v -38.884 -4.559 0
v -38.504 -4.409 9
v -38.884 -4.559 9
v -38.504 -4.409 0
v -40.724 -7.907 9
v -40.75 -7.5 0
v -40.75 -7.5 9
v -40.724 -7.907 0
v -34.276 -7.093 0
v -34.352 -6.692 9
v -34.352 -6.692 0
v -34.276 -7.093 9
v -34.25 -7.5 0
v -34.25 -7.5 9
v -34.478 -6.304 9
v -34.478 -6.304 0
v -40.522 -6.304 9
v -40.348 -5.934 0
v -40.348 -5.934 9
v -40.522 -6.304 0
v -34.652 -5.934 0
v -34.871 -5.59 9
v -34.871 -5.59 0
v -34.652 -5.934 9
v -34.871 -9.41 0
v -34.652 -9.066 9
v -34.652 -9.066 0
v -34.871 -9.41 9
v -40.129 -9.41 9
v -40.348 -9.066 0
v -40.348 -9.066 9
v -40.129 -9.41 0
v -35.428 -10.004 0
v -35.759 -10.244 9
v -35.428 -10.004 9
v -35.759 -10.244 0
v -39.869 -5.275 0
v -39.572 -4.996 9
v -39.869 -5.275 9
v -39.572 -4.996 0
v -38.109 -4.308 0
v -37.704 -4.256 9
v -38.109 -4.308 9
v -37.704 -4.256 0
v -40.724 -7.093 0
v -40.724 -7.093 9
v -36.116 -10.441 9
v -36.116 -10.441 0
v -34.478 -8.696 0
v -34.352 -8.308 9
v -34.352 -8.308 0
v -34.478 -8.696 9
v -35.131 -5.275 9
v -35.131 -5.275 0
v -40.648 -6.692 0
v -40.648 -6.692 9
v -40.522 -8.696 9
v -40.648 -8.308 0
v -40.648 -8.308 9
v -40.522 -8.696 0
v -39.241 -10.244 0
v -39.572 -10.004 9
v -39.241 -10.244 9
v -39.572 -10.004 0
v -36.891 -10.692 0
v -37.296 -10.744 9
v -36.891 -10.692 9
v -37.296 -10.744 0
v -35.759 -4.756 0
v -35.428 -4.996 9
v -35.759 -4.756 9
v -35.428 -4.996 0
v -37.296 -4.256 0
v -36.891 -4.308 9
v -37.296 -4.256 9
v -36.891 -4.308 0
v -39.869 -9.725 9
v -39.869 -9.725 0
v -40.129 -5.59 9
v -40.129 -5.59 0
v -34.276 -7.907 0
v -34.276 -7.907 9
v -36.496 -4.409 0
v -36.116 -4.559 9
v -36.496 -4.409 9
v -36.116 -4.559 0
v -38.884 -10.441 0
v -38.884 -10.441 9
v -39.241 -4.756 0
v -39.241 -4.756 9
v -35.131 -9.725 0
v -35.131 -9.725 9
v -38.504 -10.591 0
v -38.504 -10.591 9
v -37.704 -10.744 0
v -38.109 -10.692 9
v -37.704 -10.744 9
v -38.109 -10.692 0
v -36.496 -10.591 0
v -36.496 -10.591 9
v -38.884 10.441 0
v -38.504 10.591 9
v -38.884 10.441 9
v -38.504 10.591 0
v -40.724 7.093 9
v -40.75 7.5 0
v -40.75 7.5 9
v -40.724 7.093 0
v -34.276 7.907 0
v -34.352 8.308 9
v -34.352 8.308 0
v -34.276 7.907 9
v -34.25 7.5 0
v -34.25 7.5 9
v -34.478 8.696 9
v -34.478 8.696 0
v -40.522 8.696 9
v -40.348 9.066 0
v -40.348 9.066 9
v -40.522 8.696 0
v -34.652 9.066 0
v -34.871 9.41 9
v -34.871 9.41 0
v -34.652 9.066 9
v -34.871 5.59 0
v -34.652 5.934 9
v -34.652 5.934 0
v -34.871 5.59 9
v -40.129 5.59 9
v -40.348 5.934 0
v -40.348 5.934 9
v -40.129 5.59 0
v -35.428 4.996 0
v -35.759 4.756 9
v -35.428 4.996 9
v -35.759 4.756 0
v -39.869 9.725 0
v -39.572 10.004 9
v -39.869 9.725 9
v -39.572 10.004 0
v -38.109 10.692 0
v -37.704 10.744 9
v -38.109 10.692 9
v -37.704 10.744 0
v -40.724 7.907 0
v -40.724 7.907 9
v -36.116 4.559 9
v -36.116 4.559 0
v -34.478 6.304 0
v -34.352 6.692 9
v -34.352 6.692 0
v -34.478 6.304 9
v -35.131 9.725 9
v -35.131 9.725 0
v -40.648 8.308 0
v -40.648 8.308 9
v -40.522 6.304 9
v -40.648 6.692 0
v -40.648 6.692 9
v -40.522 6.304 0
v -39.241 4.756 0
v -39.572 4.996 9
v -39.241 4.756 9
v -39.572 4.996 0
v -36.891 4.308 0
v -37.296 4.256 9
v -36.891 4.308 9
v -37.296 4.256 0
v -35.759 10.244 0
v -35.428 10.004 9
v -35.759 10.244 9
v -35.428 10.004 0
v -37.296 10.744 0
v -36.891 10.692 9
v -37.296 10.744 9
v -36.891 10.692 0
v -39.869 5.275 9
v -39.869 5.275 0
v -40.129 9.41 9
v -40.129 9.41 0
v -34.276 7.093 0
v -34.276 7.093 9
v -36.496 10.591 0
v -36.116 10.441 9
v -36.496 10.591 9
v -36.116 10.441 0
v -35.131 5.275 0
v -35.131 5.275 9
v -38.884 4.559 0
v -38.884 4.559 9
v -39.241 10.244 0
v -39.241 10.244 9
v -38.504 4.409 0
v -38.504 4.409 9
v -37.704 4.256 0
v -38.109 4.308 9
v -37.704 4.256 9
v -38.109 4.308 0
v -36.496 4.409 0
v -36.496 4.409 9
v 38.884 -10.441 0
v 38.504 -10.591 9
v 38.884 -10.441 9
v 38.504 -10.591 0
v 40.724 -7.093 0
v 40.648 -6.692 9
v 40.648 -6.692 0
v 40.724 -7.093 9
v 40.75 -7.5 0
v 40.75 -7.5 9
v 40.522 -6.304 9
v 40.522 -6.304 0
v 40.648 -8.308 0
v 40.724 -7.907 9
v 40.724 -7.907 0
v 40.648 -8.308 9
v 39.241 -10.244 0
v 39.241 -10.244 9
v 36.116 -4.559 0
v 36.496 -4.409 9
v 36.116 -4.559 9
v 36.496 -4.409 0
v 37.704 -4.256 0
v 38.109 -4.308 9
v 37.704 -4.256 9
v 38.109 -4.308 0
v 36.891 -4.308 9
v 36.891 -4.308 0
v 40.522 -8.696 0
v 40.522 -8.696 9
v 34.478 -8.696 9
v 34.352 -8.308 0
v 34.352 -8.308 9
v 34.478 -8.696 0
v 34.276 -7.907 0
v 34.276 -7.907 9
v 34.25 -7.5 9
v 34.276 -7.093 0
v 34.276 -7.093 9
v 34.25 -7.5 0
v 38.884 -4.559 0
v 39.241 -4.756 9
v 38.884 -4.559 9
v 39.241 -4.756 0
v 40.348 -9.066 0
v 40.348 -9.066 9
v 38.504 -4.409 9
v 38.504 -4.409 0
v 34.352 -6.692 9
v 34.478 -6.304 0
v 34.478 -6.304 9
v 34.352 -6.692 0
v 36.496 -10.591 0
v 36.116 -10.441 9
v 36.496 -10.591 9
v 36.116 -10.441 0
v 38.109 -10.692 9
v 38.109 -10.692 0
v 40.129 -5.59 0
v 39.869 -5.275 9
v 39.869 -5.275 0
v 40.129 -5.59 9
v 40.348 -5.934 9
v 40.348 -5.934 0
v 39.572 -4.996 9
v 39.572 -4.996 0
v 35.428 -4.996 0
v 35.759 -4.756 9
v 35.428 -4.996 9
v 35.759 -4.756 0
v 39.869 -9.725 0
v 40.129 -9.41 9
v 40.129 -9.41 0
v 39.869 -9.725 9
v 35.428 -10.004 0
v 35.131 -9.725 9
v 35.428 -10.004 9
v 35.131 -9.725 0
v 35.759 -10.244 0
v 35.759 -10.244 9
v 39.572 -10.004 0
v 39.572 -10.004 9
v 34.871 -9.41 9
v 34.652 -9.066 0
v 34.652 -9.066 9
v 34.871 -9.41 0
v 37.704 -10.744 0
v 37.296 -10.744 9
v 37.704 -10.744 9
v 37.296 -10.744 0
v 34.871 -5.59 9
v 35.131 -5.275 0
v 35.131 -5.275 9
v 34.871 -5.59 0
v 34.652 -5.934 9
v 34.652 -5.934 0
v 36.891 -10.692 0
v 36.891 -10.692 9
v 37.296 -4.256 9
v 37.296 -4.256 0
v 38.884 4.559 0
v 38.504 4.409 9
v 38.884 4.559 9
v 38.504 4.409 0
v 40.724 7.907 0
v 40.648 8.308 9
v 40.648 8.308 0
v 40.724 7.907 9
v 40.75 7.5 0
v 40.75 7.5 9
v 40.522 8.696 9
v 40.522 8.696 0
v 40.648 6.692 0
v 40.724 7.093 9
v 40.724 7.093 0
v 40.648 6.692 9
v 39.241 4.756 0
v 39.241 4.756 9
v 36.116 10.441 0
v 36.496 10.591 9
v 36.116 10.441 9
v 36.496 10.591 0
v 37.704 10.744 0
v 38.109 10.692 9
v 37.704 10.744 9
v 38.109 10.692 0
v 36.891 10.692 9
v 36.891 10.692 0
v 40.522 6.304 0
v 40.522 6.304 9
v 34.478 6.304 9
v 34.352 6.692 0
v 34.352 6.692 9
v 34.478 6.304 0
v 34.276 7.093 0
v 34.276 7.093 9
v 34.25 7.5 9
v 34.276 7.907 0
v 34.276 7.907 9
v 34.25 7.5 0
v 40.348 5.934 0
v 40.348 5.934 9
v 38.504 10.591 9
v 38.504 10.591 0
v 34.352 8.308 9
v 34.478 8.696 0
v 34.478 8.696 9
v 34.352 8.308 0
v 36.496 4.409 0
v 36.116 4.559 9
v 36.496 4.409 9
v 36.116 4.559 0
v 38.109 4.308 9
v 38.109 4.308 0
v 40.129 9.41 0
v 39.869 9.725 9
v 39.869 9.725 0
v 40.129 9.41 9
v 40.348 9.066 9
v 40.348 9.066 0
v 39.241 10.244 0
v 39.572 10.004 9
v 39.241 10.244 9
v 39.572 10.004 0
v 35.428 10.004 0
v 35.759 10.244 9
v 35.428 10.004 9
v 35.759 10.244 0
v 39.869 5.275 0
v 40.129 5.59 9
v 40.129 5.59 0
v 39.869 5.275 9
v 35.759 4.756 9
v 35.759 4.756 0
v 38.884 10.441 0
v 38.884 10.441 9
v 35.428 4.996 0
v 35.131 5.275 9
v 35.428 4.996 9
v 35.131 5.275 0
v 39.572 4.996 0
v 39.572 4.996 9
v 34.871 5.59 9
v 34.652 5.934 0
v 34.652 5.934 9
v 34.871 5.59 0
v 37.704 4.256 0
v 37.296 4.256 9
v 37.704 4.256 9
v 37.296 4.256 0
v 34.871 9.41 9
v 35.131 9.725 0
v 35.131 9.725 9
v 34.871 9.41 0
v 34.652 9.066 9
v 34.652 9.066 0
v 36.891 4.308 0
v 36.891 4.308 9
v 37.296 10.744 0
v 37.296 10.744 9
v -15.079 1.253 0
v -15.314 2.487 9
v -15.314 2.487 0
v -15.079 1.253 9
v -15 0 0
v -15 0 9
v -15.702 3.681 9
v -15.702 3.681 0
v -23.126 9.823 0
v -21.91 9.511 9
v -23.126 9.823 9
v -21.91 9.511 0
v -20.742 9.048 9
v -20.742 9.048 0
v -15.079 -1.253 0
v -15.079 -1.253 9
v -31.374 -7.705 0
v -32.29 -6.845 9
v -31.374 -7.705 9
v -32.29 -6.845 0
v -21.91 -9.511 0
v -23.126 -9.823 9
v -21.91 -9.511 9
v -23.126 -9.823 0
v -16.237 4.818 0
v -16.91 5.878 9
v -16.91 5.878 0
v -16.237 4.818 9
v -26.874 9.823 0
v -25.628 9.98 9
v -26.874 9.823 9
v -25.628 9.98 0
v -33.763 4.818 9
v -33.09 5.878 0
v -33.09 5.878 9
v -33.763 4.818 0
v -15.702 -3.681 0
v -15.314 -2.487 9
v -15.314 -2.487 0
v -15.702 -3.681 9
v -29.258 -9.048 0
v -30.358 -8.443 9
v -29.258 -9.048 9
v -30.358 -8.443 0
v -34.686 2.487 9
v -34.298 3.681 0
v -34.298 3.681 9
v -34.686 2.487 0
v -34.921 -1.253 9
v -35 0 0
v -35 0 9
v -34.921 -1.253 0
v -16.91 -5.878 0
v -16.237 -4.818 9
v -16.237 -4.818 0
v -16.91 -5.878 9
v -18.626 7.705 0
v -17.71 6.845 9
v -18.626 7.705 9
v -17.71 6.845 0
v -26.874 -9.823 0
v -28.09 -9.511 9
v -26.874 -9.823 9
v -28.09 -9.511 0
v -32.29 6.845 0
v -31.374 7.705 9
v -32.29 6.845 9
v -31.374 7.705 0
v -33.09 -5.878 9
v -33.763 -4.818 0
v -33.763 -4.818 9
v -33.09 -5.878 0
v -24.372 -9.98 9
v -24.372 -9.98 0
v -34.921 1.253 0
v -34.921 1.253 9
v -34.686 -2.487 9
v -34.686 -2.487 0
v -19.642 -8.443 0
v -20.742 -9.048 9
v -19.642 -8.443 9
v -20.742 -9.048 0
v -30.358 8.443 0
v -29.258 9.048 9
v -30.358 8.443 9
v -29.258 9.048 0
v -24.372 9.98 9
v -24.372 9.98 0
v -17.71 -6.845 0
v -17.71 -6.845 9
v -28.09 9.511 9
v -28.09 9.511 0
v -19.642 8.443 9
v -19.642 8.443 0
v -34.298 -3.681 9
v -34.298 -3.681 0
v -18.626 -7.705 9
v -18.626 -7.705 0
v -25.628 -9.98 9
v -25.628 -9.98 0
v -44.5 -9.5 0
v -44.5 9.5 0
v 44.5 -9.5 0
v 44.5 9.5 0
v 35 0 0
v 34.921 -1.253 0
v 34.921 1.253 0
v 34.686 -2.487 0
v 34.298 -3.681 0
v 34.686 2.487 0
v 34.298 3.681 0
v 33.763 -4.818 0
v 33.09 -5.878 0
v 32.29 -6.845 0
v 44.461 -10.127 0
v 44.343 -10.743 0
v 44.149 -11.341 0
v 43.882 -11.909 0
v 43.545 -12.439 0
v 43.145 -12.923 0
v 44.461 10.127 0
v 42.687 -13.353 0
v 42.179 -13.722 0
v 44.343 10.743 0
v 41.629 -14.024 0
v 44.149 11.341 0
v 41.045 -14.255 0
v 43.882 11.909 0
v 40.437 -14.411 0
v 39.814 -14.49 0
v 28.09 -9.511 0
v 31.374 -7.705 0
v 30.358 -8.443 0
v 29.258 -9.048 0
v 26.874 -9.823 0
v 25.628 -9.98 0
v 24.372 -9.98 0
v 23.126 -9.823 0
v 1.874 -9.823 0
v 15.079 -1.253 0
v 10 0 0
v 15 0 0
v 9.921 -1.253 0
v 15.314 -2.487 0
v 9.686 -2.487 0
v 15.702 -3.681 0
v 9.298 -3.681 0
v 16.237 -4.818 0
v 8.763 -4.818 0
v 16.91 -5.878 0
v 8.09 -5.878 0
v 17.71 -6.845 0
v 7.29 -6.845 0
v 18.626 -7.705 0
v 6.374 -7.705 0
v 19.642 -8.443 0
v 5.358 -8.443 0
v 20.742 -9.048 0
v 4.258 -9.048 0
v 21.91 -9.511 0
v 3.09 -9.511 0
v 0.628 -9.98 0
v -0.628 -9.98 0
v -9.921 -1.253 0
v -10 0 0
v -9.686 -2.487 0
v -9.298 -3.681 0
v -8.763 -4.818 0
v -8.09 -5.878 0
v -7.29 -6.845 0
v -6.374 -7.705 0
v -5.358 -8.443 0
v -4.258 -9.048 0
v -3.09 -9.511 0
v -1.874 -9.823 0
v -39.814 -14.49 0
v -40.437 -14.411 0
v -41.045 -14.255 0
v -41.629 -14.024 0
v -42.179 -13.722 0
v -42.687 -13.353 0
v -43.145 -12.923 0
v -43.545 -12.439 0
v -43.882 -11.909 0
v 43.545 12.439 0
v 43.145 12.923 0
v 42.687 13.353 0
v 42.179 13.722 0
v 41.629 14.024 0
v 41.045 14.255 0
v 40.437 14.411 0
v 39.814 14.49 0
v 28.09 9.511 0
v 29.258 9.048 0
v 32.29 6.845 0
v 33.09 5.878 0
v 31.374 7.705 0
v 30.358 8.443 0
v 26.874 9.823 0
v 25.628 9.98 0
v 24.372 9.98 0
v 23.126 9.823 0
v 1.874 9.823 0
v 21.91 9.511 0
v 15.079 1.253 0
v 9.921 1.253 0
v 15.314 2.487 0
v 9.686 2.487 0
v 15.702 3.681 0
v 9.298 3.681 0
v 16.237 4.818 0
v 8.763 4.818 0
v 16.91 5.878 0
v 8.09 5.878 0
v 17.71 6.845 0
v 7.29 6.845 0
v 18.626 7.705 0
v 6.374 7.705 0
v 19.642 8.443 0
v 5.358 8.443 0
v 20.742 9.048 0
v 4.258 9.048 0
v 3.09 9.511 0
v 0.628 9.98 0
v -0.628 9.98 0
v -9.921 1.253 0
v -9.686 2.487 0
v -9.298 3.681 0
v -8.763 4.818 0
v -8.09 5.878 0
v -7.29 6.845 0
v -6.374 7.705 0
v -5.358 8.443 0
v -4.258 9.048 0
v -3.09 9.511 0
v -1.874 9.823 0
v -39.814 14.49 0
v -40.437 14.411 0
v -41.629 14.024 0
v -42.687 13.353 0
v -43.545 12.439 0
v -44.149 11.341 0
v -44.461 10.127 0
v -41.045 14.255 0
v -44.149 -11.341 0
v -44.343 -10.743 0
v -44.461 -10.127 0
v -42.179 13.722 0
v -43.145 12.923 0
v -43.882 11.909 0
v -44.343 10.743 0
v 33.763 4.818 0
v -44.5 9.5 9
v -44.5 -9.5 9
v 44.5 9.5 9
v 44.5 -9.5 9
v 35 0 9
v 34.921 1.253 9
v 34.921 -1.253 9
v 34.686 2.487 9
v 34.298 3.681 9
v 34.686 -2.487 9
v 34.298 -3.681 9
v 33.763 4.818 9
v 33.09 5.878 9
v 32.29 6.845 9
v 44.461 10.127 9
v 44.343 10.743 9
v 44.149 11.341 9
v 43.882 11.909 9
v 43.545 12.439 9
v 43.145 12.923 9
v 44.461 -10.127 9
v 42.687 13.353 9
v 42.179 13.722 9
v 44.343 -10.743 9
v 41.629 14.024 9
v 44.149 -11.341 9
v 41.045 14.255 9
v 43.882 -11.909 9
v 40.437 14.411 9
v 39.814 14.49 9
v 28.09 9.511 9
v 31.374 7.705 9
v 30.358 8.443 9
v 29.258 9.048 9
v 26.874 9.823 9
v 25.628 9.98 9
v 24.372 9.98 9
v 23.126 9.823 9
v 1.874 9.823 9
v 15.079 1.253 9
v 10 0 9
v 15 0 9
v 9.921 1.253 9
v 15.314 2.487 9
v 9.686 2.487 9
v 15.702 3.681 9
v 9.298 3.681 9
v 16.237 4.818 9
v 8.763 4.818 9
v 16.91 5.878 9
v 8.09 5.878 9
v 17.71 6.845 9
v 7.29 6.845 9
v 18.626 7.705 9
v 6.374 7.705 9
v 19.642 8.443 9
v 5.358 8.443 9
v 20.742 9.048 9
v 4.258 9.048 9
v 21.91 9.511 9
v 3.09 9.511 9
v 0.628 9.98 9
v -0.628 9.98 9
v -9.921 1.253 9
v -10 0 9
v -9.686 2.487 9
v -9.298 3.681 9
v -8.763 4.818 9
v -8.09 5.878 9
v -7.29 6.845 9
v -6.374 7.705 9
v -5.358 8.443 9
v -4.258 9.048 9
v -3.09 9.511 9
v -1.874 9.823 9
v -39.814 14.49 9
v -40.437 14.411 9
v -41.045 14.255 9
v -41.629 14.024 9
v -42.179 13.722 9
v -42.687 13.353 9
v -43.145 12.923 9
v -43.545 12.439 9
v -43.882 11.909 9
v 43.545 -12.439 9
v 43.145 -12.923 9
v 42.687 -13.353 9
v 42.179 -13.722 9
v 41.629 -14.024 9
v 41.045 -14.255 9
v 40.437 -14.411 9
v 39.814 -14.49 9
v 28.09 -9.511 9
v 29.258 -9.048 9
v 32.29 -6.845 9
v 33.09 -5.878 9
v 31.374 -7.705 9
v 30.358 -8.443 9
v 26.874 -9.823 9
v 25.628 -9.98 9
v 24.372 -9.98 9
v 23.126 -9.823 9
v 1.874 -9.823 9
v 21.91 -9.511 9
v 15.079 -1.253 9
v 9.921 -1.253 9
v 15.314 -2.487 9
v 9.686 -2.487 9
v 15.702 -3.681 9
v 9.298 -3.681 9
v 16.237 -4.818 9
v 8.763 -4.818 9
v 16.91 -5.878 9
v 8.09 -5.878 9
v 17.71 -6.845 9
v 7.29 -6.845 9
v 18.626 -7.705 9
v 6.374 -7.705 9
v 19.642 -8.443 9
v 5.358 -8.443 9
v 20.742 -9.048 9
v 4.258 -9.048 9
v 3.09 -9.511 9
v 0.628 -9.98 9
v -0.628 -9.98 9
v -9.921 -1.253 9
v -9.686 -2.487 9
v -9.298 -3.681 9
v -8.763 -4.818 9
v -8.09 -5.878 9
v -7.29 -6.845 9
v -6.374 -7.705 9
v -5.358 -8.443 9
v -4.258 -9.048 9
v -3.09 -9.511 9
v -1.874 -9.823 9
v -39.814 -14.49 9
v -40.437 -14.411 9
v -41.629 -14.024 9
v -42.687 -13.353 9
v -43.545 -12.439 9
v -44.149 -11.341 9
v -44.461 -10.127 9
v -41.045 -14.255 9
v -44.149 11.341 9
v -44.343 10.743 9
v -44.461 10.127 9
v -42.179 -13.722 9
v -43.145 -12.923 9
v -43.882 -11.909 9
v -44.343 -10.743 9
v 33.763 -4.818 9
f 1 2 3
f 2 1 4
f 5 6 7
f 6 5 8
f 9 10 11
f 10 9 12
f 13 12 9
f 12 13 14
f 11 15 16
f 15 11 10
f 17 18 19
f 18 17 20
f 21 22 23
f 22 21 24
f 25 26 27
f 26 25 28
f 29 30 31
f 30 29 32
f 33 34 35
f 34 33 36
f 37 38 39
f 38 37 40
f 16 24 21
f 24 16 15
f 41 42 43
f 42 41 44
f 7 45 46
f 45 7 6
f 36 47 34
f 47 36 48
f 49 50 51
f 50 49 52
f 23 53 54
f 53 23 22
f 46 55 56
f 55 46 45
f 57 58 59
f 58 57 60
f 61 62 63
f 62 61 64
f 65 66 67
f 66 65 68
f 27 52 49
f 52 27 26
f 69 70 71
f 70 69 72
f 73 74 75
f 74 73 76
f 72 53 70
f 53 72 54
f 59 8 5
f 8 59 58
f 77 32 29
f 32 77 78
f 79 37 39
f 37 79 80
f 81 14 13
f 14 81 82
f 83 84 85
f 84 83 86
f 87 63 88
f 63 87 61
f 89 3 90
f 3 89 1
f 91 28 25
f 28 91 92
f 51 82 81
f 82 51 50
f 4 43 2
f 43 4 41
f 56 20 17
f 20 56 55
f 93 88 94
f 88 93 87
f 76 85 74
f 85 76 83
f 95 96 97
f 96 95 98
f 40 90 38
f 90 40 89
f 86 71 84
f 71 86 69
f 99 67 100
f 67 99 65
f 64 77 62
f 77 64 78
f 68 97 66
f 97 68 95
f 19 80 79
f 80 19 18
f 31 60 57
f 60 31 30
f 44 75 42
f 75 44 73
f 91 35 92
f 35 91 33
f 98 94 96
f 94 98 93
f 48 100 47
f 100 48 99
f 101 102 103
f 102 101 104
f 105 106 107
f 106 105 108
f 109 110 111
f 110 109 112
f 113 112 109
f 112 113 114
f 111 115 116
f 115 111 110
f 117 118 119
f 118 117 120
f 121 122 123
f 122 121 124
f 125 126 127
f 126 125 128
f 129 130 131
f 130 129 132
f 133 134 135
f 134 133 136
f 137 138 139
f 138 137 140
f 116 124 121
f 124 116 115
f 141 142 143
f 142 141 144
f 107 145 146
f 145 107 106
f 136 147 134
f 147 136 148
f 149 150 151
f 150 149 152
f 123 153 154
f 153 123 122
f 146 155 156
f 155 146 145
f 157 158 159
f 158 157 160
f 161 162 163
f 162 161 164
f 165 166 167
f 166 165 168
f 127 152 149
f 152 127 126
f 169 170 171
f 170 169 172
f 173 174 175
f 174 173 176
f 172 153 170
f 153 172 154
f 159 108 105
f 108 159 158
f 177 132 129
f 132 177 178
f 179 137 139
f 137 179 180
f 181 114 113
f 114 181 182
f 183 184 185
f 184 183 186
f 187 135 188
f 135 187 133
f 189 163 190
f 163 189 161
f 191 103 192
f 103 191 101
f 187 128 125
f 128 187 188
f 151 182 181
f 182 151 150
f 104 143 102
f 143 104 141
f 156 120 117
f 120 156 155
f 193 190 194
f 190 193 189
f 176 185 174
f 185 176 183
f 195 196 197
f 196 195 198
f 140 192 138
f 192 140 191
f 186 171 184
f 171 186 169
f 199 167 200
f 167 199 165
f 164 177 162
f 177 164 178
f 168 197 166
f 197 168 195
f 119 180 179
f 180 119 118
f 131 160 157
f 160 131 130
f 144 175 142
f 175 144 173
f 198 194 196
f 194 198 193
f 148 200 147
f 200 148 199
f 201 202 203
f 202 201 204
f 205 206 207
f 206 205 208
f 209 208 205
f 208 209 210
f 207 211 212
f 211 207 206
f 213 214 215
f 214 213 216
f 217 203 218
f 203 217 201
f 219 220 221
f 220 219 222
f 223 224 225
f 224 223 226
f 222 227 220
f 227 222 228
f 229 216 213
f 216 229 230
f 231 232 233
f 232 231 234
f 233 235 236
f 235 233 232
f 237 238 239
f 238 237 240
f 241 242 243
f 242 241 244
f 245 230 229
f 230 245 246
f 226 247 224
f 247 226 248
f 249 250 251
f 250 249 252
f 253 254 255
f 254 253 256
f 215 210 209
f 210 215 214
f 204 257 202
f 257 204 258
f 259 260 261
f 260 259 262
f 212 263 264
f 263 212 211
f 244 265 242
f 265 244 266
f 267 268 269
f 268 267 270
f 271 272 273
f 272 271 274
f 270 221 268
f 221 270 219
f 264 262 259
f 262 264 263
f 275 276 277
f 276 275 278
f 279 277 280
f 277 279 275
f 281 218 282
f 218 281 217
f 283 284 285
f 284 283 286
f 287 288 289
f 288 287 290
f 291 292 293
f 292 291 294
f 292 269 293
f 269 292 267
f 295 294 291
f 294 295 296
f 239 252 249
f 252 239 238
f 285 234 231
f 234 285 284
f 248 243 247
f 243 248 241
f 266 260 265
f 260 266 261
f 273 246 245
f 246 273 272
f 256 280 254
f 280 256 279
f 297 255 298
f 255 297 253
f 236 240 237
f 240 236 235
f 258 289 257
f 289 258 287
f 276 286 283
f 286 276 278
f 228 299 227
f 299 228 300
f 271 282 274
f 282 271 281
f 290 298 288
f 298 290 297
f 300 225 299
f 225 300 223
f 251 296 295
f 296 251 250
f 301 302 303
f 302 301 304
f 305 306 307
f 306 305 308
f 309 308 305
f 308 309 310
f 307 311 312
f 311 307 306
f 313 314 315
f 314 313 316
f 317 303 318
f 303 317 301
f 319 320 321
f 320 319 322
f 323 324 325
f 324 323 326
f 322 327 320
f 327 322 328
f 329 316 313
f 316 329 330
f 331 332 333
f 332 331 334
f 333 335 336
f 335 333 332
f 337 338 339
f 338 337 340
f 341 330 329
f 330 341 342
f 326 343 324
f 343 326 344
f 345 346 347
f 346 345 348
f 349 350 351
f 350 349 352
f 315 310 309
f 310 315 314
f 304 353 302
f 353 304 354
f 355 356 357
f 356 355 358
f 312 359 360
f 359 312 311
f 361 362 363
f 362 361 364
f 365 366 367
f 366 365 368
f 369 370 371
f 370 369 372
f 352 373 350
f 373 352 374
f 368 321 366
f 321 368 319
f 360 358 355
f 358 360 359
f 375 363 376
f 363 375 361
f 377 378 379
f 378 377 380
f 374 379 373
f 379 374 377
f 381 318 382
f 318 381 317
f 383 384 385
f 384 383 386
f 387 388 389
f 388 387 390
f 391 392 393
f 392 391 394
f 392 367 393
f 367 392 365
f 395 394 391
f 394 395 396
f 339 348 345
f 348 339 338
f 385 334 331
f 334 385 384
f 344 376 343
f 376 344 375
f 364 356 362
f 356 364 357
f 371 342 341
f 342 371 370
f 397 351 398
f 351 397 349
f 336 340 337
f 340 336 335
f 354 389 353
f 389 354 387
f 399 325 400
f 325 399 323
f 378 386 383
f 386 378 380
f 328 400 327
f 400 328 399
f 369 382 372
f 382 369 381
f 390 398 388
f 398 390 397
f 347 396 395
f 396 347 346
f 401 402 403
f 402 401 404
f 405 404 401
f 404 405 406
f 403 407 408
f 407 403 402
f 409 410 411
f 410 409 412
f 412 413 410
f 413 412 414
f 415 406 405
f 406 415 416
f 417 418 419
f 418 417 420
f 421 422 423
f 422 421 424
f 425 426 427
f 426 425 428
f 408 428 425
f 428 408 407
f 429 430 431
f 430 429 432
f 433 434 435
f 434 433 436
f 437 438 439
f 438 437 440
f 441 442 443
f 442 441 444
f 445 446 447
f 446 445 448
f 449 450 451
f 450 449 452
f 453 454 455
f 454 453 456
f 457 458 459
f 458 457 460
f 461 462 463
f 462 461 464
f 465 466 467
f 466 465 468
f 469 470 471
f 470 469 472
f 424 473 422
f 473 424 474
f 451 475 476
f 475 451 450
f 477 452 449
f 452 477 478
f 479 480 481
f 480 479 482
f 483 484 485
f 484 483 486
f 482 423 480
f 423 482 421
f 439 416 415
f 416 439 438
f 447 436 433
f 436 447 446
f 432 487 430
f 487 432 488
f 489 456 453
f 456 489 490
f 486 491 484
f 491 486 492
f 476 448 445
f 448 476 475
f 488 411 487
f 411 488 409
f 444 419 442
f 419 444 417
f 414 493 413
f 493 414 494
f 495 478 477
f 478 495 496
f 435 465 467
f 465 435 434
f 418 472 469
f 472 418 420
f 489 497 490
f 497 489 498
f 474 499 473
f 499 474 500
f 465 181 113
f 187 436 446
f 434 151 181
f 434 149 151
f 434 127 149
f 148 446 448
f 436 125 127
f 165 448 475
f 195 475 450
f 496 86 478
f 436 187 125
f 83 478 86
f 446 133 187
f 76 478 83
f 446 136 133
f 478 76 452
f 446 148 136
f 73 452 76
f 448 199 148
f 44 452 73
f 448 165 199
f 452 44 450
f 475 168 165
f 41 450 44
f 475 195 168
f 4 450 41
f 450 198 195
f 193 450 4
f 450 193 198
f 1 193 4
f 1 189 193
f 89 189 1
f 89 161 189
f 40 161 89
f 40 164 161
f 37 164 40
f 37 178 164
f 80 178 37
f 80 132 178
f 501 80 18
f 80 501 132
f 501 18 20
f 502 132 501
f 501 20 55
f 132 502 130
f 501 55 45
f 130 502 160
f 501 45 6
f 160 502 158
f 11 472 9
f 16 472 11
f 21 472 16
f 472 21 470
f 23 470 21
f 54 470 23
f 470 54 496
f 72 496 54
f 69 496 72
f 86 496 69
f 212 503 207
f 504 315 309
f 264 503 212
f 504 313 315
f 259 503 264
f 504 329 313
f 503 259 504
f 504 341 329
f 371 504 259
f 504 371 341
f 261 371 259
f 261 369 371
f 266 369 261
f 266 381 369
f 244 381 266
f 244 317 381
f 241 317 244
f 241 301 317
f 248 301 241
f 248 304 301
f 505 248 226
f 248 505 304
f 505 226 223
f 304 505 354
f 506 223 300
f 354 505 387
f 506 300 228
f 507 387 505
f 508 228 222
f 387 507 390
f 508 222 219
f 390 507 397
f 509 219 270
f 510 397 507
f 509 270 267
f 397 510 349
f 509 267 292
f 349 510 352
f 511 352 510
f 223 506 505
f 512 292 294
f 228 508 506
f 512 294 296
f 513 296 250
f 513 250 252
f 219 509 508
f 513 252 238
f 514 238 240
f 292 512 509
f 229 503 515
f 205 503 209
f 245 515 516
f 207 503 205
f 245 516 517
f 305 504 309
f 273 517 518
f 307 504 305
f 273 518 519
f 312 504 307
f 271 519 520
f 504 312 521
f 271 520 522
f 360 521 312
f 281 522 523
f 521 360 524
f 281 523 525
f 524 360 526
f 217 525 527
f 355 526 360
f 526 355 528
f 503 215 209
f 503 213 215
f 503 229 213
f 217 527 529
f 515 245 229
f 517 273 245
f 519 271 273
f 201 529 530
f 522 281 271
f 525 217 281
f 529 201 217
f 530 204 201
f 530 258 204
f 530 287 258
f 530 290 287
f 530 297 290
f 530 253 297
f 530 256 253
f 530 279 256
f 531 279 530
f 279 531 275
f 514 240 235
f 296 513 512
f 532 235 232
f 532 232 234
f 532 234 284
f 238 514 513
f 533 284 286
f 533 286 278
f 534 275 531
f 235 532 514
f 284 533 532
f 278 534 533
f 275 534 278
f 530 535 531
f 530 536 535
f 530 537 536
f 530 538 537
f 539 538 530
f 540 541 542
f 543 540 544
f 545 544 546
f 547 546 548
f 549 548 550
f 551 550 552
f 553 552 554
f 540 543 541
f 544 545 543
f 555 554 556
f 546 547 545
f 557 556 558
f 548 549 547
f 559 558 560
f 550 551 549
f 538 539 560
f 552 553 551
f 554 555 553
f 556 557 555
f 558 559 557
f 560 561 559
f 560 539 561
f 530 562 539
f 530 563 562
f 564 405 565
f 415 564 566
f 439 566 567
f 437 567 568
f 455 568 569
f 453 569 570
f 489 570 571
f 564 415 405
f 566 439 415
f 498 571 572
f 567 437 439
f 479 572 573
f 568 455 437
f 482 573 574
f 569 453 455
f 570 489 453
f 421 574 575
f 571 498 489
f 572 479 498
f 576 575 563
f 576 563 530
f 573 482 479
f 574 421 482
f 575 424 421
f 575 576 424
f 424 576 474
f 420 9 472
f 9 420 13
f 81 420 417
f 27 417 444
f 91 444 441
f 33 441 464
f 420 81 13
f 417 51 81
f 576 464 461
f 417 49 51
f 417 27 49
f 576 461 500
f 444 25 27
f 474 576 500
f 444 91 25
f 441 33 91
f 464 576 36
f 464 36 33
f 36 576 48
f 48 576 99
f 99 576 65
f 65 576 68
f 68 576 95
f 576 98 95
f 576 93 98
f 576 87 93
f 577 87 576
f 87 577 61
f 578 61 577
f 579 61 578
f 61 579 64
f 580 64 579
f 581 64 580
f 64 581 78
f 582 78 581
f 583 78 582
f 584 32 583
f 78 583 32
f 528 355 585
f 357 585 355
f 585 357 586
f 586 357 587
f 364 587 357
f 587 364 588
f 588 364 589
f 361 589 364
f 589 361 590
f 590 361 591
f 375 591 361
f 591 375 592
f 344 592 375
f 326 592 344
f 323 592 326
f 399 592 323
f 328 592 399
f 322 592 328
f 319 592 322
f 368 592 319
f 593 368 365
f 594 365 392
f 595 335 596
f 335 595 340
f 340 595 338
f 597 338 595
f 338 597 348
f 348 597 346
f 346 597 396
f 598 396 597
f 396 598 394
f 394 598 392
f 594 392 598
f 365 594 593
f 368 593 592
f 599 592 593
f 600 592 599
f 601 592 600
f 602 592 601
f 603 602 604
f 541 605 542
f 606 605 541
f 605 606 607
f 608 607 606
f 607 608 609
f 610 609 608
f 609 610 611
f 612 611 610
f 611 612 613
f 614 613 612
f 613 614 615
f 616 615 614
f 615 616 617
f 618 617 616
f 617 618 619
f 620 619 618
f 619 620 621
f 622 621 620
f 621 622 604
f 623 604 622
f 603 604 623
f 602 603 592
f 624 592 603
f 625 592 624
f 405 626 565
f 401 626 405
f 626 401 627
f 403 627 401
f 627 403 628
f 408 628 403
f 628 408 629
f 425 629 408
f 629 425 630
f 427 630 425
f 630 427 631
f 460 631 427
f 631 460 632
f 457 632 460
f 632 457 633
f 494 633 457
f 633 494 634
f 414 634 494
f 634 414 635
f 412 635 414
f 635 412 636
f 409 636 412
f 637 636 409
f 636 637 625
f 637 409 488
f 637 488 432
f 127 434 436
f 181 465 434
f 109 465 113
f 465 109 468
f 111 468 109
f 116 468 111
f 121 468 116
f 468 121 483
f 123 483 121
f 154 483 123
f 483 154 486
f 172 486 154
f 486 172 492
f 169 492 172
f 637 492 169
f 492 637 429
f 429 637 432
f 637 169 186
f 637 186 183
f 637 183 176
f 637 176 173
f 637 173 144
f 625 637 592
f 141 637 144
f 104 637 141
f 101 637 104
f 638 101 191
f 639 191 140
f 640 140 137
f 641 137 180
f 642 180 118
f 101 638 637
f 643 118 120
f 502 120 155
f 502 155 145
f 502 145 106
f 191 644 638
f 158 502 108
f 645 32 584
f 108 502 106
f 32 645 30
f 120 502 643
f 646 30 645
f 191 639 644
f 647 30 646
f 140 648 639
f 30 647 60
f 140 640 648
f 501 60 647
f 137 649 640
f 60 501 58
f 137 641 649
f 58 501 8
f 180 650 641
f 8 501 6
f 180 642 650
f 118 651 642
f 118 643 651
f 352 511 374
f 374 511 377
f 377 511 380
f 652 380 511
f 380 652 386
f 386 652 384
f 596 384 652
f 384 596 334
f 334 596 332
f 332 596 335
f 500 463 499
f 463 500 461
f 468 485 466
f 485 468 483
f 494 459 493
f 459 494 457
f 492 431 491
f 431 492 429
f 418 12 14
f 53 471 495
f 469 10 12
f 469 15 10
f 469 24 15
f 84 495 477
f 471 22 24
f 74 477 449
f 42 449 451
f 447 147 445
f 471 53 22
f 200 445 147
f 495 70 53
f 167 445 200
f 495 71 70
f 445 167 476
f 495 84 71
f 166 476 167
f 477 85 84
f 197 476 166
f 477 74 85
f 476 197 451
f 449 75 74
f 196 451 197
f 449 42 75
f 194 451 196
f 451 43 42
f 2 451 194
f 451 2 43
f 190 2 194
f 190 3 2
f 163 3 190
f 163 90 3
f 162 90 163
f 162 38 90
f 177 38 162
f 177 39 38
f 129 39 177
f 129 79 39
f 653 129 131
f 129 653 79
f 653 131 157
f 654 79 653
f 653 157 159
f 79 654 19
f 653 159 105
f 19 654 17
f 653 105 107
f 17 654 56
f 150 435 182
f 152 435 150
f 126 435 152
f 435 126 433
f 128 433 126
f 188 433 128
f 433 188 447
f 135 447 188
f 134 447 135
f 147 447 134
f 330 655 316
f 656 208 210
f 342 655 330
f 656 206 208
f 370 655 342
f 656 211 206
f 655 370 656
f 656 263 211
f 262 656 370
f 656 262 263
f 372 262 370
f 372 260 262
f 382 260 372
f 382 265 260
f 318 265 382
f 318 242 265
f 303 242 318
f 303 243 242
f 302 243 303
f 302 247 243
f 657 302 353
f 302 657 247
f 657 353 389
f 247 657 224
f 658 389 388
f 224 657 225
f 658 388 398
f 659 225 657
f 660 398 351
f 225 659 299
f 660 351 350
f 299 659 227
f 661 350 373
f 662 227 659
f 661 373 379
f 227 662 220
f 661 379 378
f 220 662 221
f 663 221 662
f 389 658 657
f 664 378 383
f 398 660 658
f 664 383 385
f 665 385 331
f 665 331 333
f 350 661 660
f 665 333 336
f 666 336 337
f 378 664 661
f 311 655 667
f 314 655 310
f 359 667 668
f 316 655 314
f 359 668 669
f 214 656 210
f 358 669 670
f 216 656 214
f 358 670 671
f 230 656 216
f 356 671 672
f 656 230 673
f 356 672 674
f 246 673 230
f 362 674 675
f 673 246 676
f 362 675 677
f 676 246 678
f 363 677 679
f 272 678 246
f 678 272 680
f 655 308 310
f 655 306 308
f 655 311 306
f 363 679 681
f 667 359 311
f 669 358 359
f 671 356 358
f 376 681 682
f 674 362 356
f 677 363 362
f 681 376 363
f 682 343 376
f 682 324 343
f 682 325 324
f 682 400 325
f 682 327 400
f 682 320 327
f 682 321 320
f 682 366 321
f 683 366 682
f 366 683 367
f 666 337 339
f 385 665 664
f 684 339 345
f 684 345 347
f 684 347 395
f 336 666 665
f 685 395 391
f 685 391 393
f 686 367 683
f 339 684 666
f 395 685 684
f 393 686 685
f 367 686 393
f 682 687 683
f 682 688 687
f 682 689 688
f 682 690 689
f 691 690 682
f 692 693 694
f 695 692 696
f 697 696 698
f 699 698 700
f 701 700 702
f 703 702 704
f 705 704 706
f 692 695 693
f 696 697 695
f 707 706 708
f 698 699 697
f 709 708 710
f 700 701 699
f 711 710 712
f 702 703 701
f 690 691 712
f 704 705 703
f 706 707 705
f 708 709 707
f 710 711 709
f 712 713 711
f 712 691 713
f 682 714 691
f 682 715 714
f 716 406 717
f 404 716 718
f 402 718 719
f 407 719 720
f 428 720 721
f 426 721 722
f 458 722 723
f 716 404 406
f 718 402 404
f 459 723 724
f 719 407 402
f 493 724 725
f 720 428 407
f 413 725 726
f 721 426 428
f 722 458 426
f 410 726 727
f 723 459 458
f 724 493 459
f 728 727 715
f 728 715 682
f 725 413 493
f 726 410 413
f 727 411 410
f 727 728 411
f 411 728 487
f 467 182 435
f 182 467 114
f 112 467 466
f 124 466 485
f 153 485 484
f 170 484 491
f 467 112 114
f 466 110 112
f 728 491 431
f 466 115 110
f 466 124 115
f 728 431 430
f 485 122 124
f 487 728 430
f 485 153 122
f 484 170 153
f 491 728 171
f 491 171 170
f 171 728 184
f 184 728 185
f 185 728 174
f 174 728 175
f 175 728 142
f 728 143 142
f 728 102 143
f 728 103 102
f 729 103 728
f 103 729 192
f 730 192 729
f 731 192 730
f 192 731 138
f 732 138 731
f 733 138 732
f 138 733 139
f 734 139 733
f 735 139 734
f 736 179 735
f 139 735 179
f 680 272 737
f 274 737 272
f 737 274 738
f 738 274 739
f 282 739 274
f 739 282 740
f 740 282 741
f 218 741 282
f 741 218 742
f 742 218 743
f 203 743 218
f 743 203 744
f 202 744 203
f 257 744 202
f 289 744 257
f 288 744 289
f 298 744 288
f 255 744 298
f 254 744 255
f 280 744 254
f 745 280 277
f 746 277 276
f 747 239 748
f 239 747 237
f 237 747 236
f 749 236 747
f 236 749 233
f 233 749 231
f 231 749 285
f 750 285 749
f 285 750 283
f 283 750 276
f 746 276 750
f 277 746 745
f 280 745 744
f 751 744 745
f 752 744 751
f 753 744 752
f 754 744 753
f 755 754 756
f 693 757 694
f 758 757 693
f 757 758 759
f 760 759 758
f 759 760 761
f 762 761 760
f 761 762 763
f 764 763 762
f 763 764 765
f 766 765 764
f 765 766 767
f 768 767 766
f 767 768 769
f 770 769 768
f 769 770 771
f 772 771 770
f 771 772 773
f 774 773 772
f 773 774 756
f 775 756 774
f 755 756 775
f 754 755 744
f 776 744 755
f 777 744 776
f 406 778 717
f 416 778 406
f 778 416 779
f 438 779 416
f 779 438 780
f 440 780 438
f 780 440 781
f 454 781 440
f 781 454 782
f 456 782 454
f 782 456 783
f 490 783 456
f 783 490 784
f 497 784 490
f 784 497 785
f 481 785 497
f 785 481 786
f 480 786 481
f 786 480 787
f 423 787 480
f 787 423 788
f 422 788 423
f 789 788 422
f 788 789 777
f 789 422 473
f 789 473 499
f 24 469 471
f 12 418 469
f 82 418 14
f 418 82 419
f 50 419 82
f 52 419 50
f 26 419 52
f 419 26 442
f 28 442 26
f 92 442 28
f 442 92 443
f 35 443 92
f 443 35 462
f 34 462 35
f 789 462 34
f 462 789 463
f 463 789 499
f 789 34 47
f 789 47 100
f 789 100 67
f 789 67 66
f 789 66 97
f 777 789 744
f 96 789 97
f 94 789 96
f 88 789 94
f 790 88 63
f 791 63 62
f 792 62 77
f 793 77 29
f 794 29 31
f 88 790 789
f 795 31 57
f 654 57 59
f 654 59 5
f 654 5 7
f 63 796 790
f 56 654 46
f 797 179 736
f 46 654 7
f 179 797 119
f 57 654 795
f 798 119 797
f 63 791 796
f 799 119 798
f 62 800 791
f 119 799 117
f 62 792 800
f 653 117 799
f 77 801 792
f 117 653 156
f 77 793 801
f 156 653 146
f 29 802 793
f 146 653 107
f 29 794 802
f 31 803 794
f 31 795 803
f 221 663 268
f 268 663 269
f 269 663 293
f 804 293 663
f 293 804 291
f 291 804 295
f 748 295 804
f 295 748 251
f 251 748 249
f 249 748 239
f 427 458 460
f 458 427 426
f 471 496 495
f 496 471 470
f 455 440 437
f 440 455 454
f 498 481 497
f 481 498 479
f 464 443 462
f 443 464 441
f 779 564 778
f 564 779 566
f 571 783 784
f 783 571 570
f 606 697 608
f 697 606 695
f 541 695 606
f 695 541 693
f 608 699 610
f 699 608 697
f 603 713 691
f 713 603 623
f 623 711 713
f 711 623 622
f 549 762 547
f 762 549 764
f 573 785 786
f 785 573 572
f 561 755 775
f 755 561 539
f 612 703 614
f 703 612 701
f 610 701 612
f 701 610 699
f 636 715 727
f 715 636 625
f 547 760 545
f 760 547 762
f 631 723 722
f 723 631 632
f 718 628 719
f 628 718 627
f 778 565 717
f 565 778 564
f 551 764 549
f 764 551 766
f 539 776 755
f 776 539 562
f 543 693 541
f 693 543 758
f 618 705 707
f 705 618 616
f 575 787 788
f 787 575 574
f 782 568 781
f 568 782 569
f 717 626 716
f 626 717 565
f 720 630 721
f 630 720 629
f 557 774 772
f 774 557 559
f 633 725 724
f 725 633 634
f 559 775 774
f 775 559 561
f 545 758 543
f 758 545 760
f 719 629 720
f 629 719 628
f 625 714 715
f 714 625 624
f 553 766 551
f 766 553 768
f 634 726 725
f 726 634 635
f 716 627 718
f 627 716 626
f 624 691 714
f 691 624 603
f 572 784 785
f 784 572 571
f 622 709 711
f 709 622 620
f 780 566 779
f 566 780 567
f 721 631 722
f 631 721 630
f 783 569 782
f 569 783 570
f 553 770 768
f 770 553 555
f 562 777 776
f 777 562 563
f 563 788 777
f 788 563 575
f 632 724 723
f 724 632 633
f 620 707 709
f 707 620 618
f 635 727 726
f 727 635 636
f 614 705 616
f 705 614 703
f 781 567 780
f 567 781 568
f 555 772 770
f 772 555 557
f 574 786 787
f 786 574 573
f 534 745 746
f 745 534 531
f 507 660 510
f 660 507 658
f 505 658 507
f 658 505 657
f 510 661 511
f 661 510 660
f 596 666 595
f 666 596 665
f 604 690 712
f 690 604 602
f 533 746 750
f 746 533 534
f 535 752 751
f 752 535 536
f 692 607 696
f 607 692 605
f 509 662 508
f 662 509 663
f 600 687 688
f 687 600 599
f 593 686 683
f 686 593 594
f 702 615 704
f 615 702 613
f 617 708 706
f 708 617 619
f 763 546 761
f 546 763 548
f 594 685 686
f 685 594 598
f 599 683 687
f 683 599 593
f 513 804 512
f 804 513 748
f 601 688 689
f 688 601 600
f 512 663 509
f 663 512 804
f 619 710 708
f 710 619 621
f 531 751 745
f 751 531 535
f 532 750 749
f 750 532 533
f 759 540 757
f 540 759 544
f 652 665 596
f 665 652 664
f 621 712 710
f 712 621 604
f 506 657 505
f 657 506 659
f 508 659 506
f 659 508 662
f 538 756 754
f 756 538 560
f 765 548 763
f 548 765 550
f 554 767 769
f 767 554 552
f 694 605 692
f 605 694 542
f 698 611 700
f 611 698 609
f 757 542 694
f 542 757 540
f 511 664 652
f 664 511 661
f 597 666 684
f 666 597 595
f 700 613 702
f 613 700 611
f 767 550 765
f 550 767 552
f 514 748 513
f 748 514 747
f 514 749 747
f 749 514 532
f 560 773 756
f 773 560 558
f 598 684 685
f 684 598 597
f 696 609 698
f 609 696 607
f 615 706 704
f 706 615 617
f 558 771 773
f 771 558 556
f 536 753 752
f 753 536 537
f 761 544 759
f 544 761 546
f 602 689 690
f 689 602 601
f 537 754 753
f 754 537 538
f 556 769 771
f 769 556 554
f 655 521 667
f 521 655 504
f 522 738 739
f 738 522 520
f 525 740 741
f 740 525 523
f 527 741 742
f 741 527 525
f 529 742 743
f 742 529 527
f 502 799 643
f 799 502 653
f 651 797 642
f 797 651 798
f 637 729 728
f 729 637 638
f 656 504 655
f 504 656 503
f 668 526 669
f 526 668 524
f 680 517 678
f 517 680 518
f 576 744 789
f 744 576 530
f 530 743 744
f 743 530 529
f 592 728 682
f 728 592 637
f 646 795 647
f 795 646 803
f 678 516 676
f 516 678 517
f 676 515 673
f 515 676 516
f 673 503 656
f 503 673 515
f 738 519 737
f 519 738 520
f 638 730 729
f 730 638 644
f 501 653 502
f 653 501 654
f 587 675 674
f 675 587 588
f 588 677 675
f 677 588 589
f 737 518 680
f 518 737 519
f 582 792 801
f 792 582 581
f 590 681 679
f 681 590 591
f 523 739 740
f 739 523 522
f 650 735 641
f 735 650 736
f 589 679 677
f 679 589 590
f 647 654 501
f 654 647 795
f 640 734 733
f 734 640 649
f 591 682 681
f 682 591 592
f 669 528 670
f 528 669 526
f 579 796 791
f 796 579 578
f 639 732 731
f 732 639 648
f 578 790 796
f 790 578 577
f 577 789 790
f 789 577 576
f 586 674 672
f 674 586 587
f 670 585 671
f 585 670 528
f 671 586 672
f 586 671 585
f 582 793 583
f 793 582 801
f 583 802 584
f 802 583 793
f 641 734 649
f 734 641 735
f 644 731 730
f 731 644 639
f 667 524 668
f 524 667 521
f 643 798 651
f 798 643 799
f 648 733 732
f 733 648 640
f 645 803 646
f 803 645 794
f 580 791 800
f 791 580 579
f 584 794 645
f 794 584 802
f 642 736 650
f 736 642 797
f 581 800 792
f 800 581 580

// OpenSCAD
$fn = 50;


difference() {
	union() {
		hull() {
			translate(v = [-39.5000000000, 9.5000000000, 0]) {
				cylinder(h = 9, r = 5);
			}
			translate(v = [39.5000000000, 9.5000000000, 0]) {
				cylinder(h = 9, r = 5);
			}
			translate(v = [-39.5000000000, -9.5000000000, 0]) {
				cylinder(h = 9, r = 5);
			}
			translate(v = [39.5000000000, -9.5000000000, 0]) {
				cylinder(h = 9, r = 5);
			}
		}
	}
	union() {
		#translate(v = [-37.5000000000, -7.5000000000, -100.0000000000]) {
			cylinder(h = 200, r = 3.2500000000);
		}
		#translate(v = [-37.5000000000, 7.5000000000, -100.0000000000]) {
			cylinder(h = 200, r = 3.2500000000);
		}
		#translate(v = [37.5000000000, -7.5000000000, -100.0000000000]) {
			cylinder(h = 200, r = 3.2500000000);
		}
		#translate(v = [37.5000000000, 7.5000000000, -100.0000000000]) {
			cylinder(h = 200, r = 3.2500000000);
		}
		#translate(v = [-25.0000000000, 0, 0]) {
			cylinder(h = 9, r = 10.0000000000);
		}
		#cylinder(h = 9, r = 10.0000000000);
		#translate(v = [25.0000000000, 0, 0]) {
			cylinder(h = 9, r = 10.0000000000);
		}
	}
}
